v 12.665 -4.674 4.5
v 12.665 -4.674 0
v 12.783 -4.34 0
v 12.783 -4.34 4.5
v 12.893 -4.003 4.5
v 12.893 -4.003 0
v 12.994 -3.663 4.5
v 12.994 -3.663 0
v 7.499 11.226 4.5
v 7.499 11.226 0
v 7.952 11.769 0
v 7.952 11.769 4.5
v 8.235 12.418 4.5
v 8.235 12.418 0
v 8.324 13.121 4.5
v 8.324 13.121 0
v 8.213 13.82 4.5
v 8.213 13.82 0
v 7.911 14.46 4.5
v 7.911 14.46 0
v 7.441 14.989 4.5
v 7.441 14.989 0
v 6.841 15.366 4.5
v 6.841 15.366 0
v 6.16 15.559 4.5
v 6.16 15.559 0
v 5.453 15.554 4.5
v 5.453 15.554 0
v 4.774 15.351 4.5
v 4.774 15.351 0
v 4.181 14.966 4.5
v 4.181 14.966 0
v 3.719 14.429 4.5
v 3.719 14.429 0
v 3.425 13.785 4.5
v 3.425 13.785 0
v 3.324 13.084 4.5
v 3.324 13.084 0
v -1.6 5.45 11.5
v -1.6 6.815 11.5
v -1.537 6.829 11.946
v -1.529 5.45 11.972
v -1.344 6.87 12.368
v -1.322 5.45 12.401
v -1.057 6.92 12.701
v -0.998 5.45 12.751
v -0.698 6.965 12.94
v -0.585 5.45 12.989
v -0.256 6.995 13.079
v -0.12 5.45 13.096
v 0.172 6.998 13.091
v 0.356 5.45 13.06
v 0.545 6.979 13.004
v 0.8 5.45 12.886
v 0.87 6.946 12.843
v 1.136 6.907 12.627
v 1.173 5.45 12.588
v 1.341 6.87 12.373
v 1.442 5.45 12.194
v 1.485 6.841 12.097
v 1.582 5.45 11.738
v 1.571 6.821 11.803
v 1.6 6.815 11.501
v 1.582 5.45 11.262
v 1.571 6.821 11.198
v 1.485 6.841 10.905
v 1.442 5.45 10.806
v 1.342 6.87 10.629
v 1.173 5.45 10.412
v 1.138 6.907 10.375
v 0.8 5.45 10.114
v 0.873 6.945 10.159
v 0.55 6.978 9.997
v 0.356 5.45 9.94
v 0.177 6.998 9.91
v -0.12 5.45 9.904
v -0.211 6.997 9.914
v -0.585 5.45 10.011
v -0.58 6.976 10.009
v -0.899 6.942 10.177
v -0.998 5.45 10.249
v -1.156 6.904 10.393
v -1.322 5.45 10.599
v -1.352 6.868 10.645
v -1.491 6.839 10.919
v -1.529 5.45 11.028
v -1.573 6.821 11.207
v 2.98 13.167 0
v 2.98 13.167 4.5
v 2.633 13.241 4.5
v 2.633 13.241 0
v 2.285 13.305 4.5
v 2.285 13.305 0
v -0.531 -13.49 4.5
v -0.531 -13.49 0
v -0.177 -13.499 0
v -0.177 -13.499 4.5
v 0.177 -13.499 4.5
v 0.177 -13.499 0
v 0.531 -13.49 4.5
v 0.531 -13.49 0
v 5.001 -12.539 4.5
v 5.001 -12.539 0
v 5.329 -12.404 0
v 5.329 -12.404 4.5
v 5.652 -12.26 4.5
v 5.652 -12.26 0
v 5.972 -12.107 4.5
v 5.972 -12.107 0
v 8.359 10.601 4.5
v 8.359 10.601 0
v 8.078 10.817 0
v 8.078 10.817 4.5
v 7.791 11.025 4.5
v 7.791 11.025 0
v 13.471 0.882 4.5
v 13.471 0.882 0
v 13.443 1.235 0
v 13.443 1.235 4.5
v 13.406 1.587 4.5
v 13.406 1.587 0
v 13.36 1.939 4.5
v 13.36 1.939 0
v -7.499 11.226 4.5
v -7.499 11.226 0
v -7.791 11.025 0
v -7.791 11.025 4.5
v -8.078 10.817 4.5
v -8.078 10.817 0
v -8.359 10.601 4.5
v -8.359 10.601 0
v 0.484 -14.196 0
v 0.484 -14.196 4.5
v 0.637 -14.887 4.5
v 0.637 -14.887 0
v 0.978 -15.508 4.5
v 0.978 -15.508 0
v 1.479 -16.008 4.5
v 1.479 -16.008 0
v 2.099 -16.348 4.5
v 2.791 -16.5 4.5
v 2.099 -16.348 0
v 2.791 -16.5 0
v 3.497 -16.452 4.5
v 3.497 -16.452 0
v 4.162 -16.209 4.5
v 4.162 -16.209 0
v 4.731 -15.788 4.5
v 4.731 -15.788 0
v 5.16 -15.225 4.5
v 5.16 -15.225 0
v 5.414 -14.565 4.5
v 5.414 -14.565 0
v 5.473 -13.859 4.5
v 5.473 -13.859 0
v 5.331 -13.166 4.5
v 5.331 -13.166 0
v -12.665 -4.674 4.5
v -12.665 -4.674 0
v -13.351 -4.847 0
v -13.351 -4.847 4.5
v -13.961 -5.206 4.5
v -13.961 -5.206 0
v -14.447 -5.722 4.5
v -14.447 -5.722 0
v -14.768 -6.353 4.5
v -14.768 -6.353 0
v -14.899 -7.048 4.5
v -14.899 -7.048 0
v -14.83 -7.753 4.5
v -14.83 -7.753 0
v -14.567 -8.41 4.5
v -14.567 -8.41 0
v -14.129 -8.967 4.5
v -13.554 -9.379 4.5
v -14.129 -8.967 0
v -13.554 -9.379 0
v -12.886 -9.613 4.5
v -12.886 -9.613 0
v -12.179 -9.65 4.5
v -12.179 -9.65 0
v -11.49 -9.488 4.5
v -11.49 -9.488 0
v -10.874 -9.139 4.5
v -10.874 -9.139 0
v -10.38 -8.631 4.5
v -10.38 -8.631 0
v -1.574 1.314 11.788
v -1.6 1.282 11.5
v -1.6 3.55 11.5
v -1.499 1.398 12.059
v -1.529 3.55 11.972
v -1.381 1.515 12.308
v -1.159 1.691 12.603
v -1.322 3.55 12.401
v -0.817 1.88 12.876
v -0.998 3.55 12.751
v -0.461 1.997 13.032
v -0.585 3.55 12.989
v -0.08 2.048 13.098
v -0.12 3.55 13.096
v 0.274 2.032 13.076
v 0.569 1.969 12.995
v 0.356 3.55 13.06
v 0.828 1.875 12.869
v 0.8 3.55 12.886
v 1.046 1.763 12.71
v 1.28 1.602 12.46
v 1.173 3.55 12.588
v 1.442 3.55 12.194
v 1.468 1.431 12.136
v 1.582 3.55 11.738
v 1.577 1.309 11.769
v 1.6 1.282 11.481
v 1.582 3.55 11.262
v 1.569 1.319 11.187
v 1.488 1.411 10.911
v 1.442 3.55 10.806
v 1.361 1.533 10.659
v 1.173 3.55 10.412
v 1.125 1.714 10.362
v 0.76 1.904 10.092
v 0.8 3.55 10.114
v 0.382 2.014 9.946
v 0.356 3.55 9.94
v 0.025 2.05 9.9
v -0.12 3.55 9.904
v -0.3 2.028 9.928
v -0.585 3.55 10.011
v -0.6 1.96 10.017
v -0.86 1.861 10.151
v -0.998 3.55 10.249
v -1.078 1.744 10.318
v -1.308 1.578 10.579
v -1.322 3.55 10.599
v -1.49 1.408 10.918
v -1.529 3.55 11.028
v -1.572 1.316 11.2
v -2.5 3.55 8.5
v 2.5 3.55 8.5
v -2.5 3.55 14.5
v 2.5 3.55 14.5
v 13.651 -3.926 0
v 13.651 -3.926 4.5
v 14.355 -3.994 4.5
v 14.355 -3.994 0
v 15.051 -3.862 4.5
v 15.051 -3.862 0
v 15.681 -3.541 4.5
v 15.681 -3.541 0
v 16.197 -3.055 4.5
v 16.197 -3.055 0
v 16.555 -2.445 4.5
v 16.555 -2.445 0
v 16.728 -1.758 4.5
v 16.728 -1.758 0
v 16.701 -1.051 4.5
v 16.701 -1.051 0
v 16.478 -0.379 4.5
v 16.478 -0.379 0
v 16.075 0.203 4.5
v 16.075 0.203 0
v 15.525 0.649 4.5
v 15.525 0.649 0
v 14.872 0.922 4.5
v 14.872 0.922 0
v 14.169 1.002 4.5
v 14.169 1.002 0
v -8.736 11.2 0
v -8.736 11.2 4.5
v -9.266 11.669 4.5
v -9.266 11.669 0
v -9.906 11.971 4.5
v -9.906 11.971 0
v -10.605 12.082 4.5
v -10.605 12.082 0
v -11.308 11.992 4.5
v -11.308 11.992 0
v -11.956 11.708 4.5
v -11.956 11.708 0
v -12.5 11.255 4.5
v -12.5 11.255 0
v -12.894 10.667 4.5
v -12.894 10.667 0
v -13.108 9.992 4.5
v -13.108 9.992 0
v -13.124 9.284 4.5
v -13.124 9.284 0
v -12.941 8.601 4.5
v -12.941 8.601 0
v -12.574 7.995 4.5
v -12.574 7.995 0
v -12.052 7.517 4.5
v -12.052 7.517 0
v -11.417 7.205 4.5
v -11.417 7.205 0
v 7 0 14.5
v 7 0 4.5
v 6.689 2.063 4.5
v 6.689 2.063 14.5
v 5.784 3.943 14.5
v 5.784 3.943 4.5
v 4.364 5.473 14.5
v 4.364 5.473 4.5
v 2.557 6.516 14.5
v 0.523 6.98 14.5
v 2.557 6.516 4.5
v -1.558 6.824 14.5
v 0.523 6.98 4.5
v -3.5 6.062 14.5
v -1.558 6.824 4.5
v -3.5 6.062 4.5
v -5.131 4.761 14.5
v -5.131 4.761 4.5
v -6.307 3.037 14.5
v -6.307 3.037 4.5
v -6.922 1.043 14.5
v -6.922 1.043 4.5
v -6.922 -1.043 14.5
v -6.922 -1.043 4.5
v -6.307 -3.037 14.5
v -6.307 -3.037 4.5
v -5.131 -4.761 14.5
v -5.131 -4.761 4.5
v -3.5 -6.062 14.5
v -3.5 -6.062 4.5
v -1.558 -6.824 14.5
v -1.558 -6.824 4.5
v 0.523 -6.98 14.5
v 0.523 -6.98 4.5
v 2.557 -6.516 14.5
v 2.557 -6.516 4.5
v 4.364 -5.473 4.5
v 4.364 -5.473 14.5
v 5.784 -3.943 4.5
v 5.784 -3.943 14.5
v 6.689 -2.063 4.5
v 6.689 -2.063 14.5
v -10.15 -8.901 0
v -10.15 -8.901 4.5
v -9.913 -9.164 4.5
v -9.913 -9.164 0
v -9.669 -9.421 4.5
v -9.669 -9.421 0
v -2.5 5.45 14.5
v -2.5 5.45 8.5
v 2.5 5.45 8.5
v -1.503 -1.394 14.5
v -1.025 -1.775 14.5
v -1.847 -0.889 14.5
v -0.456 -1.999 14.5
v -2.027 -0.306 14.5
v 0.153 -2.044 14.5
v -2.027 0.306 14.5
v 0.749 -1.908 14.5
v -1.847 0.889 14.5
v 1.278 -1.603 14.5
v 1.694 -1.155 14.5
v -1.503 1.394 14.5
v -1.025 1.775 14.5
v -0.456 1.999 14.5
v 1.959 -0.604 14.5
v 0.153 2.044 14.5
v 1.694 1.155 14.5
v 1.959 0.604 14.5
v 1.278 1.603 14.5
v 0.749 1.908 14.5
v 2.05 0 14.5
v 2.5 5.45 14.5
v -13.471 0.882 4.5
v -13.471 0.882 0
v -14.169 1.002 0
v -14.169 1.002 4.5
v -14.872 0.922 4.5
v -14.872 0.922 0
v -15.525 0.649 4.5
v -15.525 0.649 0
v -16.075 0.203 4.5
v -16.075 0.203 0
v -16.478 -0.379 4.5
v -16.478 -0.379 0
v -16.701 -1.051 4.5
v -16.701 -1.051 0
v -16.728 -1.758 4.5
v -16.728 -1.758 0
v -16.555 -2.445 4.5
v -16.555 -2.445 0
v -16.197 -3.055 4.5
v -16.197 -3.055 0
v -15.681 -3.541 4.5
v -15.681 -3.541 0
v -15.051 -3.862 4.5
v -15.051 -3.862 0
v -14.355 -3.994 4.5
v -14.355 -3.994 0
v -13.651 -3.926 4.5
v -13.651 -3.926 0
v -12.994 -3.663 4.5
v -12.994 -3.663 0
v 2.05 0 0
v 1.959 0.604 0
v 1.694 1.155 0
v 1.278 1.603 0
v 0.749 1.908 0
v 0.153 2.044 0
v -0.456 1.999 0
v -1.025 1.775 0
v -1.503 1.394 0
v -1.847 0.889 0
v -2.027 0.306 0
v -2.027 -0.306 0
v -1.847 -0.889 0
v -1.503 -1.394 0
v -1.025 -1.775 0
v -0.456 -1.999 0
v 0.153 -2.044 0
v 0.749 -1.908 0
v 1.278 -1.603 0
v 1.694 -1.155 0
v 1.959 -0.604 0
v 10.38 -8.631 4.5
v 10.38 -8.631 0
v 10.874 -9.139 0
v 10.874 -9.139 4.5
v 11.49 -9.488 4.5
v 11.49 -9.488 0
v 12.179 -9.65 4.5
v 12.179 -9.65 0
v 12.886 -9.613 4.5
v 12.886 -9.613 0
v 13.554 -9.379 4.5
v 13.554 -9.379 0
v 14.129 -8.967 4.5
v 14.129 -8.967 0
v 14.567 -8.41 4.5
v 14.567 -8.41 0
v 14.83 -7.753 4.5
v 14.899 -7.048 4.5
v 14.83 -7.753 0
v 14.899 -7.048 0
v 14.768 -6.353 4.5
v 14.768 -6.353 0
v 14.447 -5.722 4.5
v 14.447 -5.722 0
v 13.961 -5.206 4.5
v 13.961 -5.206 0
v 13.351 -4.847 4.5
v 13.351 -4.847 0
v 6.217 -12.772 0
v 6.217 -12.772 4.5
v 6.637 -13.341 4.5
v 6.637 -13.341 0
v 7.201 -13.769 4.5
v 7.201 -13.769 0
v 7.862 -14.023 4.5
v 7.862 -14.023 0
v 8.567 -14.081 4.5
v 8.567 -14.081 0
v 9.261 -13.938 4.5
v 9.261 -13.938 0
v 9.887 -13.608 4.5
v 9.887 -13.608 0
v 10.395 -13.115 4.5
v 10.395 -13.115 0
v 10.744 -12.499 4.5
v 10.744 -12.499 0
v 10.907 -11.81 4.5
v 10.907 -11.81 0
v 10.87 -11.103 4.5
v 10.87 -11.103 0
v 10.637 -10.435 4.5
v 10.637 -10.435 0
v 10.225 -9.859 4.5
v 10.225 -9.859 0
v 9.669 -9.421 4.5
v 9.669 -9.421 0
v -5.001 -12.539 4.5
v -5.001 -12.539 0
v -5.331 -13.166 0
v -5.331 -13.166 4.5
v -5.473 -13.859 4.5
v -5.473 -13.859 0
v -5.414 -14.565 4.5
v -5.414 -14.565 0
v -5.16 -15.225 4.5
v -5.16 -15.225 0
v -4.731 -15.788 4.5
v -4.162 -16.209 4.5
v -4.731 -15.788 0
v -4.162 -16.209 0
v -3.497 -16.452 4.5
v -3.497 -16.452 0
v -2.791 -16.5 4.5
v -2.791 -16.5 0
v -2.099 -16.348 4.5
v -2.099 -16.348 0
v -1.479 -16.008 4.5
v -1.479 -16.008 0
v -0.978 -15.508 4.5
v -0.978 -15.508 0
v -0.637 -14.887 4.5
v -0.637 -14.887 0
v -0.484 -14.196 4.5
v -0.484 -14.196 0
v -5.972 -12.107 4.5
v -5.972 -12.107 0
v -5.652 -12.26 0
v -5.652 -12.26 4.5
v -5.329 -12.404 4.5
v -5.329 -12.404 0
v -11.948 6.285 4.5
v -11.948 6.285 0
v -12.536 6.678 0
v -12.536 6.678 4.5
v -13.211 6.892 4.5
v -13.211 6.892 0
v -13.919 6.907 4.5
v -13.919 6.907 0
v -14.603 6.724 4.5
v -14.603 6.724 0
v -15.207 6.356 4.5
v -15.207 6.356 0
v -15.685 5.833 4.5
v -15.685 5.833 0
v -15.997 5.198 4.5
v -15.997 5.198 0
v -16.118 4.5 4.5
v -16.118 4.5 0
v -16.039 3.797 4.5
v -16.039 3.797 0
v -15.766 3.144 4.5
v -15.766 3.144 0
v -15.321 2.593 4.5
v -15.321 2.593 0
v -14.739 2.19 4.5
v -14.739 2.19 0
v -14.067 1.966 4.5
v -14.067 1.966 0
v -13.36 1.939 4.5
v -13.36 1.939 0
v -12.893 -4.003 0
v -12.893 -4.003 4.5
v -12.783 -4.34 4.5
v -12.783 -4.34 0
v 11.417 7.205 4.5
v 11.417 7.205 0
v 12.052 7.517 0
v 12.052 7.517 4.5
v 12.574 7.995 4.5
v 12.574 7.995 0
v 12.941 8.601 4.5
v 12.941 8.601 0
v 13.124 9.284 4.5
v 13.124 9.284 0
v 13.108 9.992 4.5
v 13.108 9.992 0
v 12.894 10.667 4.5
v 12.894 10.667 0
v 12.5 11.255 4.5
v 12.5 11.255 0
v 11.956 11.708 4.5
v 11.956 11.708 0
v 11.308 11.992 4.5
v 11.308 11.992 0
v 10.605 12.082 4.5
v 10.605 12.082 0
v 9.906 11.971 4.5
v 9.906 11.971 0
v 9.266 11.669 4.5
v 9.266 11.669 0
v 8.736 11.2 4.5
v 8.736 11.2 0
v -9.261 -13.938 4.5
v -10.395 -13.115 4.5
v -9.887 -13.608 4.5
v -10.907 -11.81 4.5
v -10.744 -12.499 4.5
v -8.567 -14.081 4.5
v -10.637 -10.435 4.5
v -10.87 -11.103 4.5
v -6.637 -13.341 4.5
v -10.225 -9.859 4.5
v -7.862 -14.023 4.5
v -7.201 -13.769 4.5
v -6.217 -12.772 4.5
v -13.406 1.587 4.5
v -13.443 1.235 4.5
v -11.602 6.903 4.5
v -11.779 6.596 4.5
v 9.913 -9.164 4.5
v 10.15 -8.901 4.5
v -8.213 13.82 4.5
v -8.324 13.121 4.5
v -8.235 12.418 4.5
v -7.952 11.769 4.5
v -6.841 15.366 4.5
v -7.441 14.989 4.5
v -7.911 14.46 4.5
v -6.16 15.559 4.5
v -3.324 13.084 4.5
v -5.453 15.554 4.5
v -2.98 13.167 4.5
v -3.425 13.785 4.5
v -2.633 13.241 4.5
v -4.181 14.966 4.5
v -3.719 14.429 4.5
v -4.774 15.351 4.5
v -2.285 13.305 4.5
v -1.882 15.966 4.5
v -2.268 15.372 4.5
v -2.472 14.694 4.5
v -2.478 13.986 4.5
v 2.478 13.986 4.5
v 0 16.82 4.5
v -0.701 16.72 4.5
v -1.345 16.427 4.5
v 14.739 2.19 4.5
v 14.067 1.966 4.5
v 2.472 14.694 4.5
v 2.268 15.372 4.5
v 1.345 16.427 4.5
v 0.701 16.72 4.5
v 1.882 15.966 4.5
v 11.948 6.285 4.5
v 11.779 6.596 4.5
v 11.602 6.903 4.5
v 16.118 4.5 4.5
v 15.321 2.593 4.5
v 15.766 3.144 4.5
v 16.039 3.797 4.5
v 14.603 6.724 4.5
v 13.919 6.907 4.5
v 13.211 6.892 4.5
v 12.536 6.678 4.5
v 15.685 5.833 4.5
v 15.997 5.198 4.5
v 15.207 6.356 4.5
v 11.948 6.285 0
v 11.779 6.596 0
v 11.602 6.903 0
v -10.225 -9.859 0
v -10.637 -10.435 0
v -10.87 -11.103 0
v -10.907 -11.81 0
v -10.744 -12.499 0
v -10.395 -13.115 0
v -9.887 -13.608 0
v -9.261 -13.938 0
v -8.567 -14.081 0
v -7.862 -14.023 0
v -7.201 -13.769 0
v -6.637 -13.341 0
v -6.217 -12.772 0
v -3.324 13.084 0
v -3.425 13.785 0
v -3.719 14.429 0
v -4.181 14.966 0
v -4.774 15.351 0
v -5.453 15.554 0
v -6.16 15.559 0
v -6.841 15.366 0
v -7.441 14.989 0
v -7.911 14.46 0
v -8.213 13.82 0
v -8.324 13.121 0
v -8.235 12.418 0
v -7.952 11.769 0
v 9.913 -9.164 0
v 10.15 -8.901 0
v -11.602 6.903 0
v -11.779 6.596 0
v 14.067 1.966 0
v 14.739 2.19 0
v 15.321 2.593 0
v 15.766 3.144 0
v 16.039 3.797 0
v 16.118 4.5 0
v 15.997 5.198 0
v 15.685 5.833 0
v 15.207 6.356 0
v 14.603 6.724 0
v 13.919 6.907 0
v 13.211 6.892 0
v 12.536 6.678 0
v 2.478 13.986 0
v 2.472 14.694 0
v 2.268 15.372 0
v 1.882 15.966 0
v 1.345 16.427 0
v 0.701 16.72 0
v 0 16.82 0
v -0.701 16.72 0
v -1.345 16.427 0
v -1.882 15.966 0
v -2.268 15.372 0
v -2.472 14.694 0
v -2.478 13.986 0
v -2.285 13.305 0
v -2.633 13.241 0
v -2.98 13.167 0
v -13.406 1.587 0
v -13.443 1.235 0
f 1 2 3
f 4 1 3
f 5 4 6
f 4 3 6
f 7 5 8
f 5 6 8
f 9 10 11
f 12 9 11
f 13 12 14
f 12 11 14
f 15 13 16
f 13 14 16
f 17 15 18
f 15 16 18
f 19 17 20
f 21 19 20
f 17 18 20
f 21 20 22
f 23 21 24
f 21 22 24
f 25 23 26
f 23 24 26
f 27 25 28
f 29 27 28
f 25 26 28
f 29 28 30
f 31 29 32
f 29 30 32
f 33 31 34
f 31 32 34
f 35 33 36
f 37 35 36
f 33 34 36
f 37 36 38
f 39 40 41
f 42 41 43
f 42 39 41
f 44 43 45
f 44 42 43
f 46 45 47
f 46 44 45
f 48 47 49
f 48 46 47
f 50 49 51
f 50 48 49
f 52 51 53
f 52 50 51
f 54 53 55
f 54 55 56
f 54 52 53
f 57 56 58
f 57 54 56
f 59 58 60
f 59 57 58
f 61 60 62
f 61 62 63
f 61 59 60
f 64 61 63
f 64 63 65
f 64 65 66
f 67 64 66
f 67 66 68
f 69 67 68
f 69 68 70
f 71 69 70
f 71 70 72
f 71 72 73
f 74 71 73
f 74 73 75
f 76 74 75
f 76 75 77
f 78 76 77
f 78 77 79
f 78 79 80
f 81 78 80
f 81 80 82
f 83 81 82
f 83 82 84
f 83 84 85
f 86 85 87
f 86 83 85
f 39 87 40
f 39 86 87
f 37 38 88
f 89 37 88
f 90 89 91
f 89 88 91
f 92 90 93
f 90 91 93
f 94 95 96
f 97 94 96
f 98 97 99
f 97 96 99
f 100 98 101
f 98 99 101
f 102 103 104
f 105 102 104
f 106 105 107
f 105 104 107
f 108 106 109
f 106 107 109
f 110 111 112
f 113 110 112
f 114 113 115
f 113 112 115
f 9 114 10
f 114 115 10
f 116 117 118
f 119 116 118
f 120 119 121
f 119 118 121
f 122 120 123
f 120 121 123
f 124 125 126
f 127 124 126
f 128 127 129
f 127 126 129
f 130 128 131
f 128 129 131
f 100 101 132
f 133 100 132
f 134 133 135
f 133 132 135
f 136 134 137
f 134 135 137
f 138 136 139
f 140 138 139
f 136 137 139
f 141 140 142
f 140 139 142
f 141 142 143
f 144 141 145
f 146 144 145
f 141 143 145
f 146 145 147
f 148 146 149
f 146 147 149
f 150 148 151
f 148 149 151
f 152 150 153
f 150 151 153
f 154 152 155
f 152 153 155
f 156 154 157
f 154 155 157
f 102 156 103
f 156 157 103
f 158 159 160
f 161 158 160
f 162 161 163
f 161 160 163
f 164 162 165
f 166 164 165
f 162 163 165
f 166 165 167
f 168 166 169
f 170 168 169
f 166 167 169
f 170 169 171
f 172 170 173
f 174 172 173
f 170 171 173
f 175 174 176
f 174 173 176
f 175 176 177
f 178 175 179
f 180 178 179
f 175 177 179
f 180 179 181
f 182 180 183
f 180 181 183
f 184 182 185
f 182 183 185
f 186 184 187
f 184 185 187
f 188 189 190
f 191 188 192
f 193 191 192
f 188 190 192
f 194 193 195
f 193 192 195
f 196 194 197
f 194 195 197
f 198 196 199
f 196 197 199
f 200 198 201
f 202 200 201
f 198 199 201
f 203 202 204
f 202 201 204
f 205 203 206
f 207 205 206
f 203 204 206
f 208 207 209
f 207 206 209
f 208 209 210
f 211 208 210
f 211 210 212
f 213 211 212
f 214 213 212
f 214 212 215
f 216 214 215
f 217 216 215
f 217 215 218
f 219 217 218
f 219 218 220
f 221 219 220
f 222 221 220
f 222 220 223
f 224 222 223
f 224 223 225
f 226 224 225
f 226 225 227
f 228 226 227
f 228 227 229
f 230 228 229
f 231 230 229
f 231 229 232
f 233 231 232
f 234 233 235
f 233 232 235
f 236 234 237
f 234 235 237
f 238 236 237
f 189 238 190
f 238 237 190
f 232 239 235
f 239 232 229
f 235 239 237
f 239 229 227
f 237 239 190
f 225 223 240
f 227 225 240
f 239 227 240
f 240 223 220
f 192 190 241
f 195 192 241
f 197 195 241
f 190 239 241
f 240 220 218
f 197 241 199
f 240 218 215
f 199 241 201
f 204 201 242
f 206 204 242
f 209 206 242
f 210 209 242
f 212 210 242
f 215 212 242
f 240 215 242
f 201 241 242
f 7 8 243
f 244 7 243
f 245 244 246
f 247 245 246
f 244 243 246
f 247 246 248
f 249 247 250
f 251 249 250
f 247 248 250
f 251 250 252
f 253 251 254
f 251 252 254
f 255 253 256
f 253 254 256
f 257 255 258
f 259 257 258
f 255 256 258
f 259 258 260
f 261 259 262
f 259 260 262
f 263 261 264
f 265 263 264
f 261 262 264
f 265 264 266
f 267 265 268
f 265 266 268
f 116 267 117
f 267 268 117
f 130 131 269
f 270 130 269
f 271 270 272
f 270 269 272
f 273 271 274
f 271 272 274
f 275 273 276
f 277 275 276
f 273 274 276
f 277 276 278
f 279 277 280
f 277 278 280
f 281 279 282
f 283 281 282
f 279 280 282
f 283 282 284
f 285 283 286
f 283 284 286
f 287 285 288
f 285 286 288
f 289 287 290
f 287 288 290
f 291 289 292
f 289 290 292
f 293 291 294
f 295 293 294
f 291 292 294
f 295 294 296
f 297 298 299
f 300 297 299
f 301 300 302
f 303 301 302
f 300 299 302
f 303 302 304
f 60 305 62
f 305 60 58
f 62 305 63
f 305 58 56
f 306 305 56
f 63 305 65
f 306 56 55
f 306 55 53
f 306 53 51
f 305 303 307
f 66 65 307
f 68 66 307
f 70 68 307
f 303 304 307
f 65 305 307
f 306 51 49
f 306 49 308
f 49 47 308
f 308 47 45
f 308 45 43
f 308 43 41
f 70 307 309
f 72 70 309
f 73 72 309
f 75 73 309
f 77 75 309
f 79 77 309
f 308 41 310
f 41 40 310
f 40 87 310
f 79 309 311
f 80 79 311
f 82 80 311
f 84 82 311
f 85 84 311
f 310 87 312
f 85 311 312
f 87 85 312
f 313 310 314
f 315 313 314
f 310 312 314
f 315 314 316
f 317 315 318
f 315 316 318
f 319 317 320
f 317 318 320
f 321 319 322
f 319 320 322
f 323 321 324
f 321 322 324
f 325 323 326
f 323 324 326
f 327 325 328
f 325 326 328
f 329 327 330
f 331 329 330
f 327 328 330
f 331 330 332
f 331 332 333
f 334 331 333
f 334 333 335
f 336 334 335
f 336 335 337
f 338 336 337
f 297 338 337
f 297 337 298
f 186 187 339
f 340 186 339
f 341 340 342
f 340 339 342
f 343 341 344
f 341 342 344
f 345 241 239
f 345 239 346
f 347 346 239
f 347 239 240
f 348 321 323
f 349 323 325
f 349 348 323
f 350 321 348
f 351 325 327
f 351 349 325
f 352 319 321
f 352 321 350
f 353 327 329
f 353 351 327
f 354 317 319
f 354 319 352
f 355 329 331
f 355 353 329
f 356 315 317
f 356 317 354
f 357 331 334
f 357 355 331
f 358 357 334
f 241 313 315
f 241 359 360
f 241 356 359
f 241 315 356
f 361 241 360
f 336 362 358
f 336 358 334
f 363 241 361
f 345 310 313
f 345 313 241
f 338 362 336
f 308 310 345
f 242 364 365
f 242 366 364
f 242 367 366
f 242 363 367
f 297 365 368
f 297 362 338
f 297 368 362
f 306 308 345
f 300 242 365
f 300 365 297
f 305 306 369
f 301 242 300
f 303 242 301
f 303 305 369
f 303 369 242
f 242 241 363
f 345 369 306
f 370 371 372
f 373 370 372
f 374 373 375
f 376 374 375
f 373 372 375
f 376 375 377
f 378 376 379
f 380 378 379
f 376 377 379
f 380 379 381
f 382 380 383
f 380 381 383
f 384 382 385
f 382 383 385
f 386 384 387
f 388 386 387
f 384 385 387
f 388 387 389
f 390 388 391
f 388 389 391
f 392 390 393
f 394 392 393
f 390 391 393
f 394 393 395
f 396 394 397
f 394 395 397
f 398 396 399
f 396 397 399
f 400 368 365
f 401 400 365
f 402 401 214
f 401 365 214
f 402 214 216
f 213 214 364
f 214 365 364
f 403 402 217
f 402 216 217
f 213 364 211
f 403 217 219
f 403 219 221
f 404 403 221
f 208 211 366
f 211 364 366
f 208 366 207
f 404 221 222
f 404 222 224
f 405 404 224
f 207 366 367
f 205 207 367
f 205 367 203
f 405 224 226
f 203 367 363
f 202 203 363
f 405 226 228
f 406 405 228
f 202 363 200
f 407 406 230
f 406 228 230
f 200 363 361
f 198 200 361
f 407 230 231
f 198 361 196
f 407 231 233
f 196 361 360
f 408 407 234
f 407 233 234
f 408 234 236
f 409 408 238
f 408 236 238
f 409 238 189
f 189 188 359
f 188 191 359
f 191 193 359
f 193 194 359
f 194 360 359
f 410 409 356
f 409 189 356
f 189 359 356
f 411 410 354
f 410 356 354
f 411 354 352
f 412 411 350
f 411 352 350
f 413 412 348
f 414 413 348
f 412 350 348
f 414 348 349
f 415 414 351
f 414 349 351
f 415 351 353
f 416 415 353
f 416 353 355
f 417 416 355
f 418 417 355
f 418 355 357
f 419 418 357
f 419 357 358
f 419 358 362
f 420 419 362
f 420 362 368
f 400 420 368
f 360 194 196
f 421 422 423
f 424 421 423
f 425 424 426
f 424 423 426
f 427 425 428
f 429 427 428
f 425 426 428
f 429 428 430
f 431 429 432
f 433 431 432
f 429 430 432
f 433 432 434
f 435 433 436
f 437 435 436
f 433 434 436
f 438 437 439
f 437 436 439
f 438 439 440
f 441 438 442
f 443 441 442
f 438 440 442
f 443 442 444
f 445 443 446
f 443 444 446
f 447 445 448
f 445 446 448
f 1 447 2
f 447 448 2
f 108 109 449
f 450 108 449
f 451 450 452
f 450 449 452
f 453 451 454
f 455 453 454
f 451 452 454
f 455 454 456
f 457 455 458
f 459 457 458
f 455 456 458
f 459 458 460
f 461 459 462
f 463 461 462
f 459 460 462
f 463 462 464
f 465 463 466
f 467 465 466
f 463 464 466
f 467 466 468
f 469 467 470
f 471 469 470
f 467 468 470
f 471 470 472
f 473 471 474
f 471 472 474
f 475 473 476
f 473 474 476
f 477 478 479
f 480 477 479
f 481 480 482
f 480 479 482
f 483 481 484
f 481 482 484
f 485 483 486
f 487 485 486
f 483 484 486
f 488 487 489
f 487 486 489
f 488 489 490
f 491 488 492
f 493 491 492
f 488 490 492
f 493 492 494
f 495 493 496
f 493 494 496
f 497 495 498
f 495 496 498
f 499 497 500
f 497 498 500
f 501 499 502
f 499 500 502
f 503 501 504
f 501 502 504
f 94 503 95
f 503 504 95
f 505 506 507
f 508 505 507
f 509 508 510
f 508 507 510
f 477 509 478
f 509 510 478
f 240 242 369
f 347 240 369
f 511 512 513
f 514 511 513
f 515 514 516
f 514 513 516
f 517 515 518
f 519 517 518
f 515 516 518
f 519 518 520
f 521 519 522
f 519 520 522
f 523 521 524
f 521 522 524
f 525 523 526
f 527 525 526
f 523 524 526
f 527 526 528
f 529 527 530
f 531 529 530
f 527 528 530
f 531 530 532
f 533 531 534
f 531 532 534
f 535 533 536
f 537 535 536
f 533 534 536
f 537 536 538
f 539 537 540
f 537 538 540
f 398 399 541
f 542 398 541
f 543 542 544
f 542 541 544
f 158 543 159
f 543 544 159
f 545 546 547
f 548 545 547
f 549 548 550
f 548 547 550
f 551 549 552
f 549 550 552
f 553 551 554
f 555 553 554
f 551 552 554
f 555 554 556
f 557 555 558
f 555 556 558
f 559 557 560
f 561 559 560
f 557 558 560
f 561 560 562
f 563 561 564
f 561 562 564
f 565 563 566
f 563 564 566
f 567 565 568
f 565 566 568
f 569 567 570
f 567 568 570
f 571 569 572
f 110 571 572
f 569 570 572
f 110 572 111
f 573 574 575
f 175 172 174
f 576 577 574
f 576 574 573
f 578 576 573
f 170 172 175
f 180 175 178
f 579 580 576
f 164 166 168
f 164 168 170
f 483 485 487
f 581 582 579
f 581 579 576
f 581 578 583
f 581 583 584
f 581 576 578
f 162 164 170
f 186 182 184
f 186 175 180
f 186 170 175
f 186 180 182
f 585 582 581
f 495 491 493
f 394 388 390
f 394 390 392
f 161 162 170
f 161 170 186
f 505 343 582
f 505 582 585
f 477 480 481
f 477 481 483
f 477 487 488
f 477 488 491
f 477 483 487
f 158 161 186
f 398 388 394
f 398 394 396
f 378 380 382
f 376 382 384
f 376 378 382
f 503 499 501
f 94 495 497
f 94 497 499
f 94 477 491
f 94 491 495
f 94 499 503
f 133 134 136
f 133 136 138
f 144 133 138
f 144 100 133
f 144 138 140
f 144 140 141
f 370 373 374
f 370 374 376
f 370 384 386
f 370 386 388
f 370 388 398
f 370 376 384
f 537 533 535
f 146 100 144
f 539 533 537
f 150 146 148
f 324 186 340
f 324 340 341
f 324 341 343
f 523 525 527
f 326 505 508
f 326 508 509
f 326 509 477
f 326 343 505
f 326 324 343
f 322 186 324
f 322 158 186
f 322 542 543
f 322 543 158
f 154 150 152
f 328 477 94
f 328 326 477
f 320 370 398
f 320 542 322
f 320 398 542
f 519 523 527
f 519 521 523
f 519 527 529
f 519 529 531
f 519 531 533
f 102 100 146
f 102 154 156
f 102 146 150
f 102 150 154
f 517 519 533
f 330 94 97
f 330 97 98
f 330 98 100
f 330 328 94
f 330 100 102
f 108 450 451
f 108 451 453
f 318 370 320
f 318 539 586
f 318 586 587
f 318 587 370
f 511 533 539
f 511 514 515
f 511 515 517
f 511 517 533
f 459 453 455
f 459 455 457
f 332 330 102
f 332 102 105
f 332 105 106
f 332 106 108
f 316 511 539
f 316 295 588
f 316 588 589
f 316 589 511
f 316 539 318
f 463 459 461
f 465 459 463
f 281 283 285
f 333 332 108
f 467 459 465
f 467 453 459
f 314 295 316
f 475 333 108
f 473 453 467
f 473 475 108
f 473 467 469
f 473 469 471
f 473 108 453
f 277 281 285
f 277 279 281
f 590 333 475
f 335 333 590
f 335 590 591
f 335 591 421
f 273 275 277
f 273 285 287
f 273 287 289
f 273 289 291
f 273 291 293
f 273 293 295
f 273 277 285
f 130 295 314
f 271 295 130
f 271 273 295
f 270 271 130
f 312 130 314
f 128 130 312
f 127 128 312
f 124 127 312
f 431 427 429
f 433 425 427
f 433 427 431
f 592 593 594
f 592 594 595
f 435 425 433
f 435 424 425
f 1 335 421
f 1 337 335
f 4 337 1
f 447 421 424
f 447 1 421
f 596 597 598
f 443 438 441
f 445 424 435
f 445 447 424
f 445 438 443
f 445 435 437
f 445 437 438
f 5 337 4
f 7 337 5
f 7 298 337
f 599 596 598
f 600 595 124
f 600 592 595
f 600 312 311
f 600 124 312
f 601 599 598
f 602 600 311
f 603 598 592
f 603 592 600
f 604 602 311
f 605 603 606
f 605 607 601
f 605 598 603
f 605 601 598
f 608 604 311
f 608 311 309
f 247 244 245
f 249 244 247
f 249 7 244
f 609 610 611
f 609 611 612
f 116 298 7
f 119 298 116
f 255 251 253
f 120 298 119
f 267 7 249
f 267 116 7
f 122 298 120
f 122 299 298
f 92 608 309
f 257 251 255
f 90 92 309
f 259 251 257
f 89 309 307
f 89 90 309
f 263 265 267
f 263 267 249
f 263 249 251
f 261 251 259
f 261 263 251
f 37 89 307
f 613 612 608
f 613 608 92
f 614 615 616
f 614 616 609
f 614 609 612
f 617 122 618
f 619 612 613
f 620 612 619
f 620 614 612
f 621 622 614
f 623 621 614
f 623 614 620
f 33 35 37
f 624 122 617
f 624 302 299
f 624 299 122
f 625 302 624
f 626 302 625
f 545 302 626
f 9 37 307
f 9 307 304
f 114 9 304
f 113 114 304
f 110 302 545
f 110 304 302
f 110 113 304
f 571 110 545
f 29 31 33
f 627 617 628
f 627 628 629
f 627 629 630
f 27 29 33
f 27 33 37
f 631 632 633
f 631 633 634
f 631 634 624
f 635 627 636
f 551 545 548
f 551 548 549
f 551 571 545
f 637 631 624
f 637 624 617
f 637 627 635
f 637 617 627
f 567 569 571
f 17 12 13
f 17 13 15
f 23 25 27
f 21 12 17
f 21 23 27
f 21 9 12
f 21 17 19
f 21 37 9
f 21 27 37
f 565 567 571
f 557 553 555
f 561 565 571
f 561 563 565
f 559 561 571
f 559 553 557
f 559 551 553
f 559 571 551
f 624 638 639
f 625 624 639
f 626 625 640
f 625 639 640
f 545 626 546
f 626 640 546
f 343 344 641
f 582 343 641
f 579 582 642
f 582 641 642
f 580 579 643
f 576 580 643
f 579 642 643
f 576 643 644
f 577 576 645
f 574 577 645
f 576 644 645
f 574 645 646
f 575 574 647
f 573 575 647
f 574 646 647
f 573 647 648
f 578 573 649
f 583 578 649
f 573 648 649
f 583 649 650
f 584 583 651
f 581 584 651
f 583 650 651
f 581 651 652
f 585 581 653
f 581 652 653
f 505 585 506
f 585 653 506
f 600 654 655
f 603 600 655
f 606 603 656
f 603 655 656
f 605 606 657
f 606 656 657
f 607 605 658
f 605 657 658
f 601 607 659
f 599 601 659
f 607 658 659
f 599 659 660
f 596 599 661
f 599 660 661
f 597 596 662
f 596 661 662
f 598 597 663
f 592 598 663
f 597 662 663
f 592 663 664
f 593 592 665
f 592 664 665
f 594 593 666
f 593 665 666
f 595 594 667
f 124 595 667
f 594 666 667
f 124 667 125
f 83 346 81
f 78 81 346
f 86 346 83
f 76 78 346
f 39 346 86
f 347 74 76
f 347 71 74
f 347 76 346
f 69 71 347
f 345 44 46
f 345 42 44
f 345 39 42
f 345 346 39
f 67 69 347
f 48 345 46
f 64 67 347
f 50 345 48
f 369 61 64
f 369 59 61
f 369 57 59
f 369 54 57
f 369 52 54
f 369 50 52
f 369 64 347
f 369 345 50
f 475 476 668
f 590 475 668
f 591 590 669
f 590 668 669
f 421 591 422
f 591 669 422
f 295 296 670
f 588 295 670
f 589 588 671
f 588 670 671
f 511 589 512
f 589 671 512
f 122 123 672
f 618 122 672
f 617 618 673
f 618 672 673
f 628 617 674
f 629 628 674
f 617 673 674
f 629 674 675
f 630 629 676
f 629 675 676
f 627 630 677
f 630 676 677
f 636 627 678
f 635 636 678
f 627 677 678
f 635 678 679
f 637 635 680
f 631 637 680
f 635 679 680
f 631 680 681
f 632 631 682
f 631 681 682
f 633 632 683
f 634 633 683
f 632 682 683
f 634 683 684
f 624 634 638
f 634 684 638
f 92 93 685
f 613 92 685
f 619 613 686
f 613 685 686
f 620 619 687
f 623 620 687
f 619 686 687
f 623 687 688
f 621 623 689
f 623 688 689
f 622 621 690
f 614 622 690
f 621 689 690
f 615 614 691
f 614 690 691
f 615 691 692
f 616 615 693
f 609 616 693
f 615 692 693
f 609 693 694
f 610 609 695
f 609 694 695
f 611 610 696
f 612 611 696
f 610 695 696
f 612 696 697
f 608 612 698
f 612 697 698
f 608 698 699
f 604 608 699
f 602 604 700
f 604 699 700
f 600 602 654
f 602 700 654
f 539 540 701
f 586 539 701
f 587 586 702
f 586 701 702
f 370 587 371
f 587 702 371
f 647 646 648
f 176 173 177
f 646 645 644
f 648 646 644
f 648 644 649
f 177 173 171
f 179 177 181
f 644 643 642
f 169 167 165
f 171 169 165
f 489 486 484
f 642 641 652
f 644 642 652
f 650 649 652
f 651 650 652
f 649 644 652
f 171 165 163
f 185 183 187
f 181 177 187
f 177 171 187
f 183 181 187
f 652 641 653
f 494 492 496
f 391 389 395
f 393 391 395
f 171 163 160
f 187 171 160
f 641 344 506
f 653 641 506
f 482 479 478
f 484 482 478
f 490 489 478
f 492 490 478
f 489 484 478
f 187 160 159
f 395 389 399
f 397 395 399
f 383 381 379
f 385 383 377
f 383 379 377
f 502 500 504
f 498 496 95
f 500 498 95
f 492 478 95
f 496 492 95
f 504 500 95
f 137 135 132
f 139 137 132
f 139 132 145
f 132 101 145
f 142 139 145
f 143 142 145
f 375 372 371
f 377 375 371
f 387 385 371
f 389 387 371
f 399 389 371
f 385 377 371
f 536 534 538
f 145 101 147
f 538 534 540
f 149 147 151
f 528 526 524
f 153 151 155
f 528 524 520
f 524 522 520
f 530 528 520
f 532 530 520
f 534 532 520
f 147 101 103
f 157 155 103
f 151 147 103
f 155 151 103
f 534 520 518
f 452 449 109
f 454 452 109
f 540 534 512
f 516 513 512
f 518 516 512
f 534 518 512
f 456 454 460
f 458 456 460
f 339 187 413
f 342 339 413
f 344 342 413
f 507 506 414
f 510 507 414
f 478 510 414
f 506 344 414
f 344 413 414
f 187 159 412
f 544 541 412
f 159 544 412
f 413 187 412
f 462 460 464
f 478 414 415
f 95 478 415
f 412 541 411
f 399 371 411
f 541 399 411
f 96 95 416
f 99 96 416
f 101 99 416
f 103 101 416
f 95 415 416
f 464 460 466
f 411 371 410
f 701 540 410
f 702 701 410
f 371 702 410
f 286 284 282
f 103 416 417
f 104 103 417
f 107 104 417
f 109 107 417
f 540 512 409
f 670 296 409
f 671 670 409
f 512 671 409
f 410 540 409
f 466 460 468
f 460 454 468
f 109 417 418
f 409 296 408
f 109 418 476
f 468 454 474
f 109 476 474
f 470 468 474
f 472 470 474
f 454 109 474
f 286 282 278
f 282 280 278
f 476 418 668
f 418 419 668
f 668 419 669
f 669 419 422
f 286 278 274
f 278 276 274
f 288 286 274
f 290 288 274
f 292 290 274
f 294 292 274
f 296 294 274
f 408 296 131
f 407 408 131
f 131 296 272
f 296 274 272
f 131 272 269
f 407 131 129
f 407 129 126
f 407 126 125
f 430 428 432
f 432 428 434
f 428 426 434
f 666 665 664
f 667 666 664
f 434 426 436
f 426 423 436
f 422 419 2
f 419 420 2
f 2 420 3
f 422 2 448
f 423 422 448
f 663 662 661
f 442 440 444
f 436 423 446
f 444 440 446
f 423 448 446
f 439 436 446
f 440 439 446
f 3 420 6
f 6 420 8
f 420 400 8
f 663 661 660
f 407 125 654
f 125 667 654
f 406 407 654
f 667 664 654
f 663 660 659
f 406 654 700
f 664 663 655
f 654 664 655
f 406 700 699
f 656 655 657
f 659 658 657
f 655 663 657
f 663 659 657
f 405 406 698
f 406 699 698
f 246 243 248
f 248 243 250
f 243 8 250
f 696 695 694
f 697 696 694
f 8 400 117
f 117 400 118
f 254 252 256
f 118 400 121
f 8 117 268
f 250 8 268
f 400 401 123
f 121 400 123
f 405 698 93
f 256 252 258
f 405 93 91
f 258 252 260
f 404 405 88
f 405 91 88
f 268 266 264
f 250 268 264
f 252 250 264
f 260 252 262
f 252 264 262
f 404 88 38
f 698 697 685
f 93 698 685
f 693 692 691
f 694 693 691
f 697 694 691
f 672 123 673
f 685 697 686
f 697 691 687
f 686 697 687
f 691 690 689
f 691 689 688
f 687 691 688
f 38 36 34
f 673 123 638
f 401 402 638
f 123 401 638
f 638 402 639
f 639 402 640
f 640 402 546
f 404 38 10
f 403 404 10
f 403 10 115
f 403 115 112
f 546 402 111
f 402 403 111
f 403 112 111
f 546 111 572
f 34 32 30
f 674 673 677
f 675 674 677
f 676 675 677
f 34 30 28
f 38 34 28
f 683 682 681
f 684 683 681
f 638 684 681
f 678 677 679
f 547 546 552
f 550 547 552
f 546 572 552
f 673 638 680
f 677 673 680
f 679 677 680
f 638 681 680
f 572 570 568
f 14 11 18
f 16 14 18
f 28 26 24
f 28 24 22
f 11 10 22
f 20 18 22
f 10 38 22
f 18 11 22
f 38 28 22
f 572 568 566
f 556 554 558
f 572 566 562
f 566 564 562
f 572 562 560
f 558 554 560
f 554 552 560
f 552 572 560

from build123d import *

# Parameters (mm, degrees)
F1_DEPTH      = 4.5
F2_R          = 7
F3_DEPTH      = 10
F4_R          = 2.05
F5_DEPTH      = 25
F6_W          = 5
F6_H          = 1.9
F7_DEPTH      = 6
F8_R          = 1.6
F9_DEPTH      = 2.2693995383
F9_DEPTH_BACK = 25


with BuildPart() as f1:
    # F0 (on Top) → F1 (new body)
    with BuildSketch(Plane.XY):
        with BuildLine():
            ThreePointArc((3.3244697782, 13.0842615647), (2.806807826, 13.2049926099), (2.284794361, 13.3052513966))
            ThreePointArc((2.284794361, 13.3052513966), (0, 16.82), (-2.284794361, 13.3052513966))
            ThreePointArc((-2.284794361, 13.3052513966), (-2.806807826, 13.2049926099), (-3.3244697782, 13.0842615647))
            ThreePointArc((-3.3244697782, 13.0842615647), (-6.8413103365, 15.3658345975), (-7.4989967985, 11.2256423877))
            ThreePointArc((-7.4989967985, 11.2256423877), (-7.9351009059, 10.9217294241), (-8.3589028909, 10.6008840414))
            ThreePointArc((-8.3589028909, 10.6008840414), (-12.4996959645, 11.254776799), (-11.4165545633, 7.2050178281))
            ThreePointArc((-11.4165545633, 7.2050178281), (-11.6913429511, 6.75), (-11.9480057555, 6.2845173614))
            ThreePointArc((-11.9480057555, 6.2845173614), (-15.9967706041, 5.1976658454), (-13.3600863279, 1.9385802306))
            ThreePointArc((-13.3600863279, 1.9385802306), (-13.4260455875, 1.4111342541), (-13.4711898808, 0.8815005365))
            ThreePointArc((-13.4711898808, 0.8815005365), (-16.7278582801, -1.7581687522), (-12.9935377939, -3.6630555003))
            ThreePointArc((-12.9935377939, -3.6630555003), (-12.83926297, -4.1717294241), (-12.6650828937, -4.6739357393))
            ThreePointArc((-12.6650828937, -4.6739357393), (-14.5665472917, -8.41), (-10.3802885327, -8.6313156574))
            ThreePointArc((-10.3802885327, -8.6313156574), (-10.0324551439, -9.0332631858), (-9.6690680157, -9.4212060644))
            ThreePointArc((-9.6690680157, -9.4212060644), (-9.8865479436, -13.6076658454), (-5.9721930823, -12.1071429242))
            ThreePointArc((-5.9721930823, -12.1071429242), (-5.4909446815, -12.3328636782), (-5.001183437, -12.539464272))
            ThreePointArc((-5.001183437, -12.539464272), (-3.4970746396, -16.4524426443), (-0.5314511923, -13.4895351896))
            ThreePointArc((-0.5314511923, -13.4895351896), (0, -13.5), (0.5314511923, -13.4895351896))
            ThreePointArc((0.5314511923, -13.4895351896), (3.4970746396, -16.4524426443), (5.001183437, -12.539464272))
            ThreePointArc((5.001183437, -12.539464272), (5.4909446815, -12.3328636782), (5.9721930823, -12.1071429242))
            ThreePointArc((5.9721930823, -12.1071429242), (9.8865479436, -13.6076658454), (9.6690680157, -9.4212060644))
            ThreePointArc((9.6690680157, -9.4212060644), (10.0324551439, -9.0332631858), (10.3802885327, -8.6313156574))
            ThreePointArc((10.3802885327, -8.6313156574), (14.5665472917, -8.41), (12.6650828937, -4.6739357393))
            ThreePointArc((12.6650828937, -4.6739357393), (12.83926297, -4.1717294241), (12.9935377939, -3.6630555003))
            ThreePointArc((12.9935377939, -3.6630555003), (16.7278582801, -1.7581687522), (13.4711898808, 0.8815005365))
            ThreePointArc((13.4711898808, 0.8815005365), (13.4260455875, 1.4111342541), (13.3600863279, 1.9385802306))
            ThreePointArc((13.3600863279, 1.9385802306), (15.9967706041, 5.1976658454), (11.9480057555, 6.2845173614))
            ThreePointArc((11.9480057555, 6.2845173614), (11.6913429511, 6.75), (11.4165545633, 7.2050178281))
            ThreePointArc((11.4165545633, 7.2050178281), (12.4996959645, 11.254776799), (8.3589028909, 10.6008840414))
            ThreePointArc((8.3589028909, 10.6008840414), (7.9351009059, 10.9217294241), (7.4989967985, 11.2256423877))
            ThreePointArc((7.4989967985, 11.2256423877), (6.8413103365, 15.3658345975), (3.3244697782, 13.0842615647))
        make_face()
    extrude(amount=F1_DEPTH)

    # F2 (on face) → F3 (join)
    with BuildSketch(Plane.XY.offset(4.5)):
        Circle(F2_R)
    extrude(amount=F3_DEPTH)

    # F4 (on face) → F5 (cut)
    with BuildSketch(Plane.XY.offset(14.5)):
        Circle(F4_R)
    extrude(amount=-F5_DEPTH, mode=Mode.SUBTRACT)

    # F6 (on face) → F7 (cut)
    with BuildSketch(Plane.XY.offset(14.5)):
        with Locations((0, 4.5)):
            Rectangle(F6_W, F6_H)
    extrude(amount=-F7_DEPTH, mode=Mode.SUBTRACT)

    # F8 (on face) → F9 (cut, two sides)
    with BuildSketch(Plane(origin=(0, 3.55, 0), x_dir=(-1, 0, 0), z_dir=(0, 1, 0))) as f9_sk:
        with Locations((0, 11.5)):
            Circle(F8_R)
    extrude(amount=-F9_DEPTH, mode=Mode.SUBTRACT)
    extrude(f9_sk.sketch, amount=F9_DEPTH_BACK, mode=Mode.SUBTRACT)


solid = f1.part
